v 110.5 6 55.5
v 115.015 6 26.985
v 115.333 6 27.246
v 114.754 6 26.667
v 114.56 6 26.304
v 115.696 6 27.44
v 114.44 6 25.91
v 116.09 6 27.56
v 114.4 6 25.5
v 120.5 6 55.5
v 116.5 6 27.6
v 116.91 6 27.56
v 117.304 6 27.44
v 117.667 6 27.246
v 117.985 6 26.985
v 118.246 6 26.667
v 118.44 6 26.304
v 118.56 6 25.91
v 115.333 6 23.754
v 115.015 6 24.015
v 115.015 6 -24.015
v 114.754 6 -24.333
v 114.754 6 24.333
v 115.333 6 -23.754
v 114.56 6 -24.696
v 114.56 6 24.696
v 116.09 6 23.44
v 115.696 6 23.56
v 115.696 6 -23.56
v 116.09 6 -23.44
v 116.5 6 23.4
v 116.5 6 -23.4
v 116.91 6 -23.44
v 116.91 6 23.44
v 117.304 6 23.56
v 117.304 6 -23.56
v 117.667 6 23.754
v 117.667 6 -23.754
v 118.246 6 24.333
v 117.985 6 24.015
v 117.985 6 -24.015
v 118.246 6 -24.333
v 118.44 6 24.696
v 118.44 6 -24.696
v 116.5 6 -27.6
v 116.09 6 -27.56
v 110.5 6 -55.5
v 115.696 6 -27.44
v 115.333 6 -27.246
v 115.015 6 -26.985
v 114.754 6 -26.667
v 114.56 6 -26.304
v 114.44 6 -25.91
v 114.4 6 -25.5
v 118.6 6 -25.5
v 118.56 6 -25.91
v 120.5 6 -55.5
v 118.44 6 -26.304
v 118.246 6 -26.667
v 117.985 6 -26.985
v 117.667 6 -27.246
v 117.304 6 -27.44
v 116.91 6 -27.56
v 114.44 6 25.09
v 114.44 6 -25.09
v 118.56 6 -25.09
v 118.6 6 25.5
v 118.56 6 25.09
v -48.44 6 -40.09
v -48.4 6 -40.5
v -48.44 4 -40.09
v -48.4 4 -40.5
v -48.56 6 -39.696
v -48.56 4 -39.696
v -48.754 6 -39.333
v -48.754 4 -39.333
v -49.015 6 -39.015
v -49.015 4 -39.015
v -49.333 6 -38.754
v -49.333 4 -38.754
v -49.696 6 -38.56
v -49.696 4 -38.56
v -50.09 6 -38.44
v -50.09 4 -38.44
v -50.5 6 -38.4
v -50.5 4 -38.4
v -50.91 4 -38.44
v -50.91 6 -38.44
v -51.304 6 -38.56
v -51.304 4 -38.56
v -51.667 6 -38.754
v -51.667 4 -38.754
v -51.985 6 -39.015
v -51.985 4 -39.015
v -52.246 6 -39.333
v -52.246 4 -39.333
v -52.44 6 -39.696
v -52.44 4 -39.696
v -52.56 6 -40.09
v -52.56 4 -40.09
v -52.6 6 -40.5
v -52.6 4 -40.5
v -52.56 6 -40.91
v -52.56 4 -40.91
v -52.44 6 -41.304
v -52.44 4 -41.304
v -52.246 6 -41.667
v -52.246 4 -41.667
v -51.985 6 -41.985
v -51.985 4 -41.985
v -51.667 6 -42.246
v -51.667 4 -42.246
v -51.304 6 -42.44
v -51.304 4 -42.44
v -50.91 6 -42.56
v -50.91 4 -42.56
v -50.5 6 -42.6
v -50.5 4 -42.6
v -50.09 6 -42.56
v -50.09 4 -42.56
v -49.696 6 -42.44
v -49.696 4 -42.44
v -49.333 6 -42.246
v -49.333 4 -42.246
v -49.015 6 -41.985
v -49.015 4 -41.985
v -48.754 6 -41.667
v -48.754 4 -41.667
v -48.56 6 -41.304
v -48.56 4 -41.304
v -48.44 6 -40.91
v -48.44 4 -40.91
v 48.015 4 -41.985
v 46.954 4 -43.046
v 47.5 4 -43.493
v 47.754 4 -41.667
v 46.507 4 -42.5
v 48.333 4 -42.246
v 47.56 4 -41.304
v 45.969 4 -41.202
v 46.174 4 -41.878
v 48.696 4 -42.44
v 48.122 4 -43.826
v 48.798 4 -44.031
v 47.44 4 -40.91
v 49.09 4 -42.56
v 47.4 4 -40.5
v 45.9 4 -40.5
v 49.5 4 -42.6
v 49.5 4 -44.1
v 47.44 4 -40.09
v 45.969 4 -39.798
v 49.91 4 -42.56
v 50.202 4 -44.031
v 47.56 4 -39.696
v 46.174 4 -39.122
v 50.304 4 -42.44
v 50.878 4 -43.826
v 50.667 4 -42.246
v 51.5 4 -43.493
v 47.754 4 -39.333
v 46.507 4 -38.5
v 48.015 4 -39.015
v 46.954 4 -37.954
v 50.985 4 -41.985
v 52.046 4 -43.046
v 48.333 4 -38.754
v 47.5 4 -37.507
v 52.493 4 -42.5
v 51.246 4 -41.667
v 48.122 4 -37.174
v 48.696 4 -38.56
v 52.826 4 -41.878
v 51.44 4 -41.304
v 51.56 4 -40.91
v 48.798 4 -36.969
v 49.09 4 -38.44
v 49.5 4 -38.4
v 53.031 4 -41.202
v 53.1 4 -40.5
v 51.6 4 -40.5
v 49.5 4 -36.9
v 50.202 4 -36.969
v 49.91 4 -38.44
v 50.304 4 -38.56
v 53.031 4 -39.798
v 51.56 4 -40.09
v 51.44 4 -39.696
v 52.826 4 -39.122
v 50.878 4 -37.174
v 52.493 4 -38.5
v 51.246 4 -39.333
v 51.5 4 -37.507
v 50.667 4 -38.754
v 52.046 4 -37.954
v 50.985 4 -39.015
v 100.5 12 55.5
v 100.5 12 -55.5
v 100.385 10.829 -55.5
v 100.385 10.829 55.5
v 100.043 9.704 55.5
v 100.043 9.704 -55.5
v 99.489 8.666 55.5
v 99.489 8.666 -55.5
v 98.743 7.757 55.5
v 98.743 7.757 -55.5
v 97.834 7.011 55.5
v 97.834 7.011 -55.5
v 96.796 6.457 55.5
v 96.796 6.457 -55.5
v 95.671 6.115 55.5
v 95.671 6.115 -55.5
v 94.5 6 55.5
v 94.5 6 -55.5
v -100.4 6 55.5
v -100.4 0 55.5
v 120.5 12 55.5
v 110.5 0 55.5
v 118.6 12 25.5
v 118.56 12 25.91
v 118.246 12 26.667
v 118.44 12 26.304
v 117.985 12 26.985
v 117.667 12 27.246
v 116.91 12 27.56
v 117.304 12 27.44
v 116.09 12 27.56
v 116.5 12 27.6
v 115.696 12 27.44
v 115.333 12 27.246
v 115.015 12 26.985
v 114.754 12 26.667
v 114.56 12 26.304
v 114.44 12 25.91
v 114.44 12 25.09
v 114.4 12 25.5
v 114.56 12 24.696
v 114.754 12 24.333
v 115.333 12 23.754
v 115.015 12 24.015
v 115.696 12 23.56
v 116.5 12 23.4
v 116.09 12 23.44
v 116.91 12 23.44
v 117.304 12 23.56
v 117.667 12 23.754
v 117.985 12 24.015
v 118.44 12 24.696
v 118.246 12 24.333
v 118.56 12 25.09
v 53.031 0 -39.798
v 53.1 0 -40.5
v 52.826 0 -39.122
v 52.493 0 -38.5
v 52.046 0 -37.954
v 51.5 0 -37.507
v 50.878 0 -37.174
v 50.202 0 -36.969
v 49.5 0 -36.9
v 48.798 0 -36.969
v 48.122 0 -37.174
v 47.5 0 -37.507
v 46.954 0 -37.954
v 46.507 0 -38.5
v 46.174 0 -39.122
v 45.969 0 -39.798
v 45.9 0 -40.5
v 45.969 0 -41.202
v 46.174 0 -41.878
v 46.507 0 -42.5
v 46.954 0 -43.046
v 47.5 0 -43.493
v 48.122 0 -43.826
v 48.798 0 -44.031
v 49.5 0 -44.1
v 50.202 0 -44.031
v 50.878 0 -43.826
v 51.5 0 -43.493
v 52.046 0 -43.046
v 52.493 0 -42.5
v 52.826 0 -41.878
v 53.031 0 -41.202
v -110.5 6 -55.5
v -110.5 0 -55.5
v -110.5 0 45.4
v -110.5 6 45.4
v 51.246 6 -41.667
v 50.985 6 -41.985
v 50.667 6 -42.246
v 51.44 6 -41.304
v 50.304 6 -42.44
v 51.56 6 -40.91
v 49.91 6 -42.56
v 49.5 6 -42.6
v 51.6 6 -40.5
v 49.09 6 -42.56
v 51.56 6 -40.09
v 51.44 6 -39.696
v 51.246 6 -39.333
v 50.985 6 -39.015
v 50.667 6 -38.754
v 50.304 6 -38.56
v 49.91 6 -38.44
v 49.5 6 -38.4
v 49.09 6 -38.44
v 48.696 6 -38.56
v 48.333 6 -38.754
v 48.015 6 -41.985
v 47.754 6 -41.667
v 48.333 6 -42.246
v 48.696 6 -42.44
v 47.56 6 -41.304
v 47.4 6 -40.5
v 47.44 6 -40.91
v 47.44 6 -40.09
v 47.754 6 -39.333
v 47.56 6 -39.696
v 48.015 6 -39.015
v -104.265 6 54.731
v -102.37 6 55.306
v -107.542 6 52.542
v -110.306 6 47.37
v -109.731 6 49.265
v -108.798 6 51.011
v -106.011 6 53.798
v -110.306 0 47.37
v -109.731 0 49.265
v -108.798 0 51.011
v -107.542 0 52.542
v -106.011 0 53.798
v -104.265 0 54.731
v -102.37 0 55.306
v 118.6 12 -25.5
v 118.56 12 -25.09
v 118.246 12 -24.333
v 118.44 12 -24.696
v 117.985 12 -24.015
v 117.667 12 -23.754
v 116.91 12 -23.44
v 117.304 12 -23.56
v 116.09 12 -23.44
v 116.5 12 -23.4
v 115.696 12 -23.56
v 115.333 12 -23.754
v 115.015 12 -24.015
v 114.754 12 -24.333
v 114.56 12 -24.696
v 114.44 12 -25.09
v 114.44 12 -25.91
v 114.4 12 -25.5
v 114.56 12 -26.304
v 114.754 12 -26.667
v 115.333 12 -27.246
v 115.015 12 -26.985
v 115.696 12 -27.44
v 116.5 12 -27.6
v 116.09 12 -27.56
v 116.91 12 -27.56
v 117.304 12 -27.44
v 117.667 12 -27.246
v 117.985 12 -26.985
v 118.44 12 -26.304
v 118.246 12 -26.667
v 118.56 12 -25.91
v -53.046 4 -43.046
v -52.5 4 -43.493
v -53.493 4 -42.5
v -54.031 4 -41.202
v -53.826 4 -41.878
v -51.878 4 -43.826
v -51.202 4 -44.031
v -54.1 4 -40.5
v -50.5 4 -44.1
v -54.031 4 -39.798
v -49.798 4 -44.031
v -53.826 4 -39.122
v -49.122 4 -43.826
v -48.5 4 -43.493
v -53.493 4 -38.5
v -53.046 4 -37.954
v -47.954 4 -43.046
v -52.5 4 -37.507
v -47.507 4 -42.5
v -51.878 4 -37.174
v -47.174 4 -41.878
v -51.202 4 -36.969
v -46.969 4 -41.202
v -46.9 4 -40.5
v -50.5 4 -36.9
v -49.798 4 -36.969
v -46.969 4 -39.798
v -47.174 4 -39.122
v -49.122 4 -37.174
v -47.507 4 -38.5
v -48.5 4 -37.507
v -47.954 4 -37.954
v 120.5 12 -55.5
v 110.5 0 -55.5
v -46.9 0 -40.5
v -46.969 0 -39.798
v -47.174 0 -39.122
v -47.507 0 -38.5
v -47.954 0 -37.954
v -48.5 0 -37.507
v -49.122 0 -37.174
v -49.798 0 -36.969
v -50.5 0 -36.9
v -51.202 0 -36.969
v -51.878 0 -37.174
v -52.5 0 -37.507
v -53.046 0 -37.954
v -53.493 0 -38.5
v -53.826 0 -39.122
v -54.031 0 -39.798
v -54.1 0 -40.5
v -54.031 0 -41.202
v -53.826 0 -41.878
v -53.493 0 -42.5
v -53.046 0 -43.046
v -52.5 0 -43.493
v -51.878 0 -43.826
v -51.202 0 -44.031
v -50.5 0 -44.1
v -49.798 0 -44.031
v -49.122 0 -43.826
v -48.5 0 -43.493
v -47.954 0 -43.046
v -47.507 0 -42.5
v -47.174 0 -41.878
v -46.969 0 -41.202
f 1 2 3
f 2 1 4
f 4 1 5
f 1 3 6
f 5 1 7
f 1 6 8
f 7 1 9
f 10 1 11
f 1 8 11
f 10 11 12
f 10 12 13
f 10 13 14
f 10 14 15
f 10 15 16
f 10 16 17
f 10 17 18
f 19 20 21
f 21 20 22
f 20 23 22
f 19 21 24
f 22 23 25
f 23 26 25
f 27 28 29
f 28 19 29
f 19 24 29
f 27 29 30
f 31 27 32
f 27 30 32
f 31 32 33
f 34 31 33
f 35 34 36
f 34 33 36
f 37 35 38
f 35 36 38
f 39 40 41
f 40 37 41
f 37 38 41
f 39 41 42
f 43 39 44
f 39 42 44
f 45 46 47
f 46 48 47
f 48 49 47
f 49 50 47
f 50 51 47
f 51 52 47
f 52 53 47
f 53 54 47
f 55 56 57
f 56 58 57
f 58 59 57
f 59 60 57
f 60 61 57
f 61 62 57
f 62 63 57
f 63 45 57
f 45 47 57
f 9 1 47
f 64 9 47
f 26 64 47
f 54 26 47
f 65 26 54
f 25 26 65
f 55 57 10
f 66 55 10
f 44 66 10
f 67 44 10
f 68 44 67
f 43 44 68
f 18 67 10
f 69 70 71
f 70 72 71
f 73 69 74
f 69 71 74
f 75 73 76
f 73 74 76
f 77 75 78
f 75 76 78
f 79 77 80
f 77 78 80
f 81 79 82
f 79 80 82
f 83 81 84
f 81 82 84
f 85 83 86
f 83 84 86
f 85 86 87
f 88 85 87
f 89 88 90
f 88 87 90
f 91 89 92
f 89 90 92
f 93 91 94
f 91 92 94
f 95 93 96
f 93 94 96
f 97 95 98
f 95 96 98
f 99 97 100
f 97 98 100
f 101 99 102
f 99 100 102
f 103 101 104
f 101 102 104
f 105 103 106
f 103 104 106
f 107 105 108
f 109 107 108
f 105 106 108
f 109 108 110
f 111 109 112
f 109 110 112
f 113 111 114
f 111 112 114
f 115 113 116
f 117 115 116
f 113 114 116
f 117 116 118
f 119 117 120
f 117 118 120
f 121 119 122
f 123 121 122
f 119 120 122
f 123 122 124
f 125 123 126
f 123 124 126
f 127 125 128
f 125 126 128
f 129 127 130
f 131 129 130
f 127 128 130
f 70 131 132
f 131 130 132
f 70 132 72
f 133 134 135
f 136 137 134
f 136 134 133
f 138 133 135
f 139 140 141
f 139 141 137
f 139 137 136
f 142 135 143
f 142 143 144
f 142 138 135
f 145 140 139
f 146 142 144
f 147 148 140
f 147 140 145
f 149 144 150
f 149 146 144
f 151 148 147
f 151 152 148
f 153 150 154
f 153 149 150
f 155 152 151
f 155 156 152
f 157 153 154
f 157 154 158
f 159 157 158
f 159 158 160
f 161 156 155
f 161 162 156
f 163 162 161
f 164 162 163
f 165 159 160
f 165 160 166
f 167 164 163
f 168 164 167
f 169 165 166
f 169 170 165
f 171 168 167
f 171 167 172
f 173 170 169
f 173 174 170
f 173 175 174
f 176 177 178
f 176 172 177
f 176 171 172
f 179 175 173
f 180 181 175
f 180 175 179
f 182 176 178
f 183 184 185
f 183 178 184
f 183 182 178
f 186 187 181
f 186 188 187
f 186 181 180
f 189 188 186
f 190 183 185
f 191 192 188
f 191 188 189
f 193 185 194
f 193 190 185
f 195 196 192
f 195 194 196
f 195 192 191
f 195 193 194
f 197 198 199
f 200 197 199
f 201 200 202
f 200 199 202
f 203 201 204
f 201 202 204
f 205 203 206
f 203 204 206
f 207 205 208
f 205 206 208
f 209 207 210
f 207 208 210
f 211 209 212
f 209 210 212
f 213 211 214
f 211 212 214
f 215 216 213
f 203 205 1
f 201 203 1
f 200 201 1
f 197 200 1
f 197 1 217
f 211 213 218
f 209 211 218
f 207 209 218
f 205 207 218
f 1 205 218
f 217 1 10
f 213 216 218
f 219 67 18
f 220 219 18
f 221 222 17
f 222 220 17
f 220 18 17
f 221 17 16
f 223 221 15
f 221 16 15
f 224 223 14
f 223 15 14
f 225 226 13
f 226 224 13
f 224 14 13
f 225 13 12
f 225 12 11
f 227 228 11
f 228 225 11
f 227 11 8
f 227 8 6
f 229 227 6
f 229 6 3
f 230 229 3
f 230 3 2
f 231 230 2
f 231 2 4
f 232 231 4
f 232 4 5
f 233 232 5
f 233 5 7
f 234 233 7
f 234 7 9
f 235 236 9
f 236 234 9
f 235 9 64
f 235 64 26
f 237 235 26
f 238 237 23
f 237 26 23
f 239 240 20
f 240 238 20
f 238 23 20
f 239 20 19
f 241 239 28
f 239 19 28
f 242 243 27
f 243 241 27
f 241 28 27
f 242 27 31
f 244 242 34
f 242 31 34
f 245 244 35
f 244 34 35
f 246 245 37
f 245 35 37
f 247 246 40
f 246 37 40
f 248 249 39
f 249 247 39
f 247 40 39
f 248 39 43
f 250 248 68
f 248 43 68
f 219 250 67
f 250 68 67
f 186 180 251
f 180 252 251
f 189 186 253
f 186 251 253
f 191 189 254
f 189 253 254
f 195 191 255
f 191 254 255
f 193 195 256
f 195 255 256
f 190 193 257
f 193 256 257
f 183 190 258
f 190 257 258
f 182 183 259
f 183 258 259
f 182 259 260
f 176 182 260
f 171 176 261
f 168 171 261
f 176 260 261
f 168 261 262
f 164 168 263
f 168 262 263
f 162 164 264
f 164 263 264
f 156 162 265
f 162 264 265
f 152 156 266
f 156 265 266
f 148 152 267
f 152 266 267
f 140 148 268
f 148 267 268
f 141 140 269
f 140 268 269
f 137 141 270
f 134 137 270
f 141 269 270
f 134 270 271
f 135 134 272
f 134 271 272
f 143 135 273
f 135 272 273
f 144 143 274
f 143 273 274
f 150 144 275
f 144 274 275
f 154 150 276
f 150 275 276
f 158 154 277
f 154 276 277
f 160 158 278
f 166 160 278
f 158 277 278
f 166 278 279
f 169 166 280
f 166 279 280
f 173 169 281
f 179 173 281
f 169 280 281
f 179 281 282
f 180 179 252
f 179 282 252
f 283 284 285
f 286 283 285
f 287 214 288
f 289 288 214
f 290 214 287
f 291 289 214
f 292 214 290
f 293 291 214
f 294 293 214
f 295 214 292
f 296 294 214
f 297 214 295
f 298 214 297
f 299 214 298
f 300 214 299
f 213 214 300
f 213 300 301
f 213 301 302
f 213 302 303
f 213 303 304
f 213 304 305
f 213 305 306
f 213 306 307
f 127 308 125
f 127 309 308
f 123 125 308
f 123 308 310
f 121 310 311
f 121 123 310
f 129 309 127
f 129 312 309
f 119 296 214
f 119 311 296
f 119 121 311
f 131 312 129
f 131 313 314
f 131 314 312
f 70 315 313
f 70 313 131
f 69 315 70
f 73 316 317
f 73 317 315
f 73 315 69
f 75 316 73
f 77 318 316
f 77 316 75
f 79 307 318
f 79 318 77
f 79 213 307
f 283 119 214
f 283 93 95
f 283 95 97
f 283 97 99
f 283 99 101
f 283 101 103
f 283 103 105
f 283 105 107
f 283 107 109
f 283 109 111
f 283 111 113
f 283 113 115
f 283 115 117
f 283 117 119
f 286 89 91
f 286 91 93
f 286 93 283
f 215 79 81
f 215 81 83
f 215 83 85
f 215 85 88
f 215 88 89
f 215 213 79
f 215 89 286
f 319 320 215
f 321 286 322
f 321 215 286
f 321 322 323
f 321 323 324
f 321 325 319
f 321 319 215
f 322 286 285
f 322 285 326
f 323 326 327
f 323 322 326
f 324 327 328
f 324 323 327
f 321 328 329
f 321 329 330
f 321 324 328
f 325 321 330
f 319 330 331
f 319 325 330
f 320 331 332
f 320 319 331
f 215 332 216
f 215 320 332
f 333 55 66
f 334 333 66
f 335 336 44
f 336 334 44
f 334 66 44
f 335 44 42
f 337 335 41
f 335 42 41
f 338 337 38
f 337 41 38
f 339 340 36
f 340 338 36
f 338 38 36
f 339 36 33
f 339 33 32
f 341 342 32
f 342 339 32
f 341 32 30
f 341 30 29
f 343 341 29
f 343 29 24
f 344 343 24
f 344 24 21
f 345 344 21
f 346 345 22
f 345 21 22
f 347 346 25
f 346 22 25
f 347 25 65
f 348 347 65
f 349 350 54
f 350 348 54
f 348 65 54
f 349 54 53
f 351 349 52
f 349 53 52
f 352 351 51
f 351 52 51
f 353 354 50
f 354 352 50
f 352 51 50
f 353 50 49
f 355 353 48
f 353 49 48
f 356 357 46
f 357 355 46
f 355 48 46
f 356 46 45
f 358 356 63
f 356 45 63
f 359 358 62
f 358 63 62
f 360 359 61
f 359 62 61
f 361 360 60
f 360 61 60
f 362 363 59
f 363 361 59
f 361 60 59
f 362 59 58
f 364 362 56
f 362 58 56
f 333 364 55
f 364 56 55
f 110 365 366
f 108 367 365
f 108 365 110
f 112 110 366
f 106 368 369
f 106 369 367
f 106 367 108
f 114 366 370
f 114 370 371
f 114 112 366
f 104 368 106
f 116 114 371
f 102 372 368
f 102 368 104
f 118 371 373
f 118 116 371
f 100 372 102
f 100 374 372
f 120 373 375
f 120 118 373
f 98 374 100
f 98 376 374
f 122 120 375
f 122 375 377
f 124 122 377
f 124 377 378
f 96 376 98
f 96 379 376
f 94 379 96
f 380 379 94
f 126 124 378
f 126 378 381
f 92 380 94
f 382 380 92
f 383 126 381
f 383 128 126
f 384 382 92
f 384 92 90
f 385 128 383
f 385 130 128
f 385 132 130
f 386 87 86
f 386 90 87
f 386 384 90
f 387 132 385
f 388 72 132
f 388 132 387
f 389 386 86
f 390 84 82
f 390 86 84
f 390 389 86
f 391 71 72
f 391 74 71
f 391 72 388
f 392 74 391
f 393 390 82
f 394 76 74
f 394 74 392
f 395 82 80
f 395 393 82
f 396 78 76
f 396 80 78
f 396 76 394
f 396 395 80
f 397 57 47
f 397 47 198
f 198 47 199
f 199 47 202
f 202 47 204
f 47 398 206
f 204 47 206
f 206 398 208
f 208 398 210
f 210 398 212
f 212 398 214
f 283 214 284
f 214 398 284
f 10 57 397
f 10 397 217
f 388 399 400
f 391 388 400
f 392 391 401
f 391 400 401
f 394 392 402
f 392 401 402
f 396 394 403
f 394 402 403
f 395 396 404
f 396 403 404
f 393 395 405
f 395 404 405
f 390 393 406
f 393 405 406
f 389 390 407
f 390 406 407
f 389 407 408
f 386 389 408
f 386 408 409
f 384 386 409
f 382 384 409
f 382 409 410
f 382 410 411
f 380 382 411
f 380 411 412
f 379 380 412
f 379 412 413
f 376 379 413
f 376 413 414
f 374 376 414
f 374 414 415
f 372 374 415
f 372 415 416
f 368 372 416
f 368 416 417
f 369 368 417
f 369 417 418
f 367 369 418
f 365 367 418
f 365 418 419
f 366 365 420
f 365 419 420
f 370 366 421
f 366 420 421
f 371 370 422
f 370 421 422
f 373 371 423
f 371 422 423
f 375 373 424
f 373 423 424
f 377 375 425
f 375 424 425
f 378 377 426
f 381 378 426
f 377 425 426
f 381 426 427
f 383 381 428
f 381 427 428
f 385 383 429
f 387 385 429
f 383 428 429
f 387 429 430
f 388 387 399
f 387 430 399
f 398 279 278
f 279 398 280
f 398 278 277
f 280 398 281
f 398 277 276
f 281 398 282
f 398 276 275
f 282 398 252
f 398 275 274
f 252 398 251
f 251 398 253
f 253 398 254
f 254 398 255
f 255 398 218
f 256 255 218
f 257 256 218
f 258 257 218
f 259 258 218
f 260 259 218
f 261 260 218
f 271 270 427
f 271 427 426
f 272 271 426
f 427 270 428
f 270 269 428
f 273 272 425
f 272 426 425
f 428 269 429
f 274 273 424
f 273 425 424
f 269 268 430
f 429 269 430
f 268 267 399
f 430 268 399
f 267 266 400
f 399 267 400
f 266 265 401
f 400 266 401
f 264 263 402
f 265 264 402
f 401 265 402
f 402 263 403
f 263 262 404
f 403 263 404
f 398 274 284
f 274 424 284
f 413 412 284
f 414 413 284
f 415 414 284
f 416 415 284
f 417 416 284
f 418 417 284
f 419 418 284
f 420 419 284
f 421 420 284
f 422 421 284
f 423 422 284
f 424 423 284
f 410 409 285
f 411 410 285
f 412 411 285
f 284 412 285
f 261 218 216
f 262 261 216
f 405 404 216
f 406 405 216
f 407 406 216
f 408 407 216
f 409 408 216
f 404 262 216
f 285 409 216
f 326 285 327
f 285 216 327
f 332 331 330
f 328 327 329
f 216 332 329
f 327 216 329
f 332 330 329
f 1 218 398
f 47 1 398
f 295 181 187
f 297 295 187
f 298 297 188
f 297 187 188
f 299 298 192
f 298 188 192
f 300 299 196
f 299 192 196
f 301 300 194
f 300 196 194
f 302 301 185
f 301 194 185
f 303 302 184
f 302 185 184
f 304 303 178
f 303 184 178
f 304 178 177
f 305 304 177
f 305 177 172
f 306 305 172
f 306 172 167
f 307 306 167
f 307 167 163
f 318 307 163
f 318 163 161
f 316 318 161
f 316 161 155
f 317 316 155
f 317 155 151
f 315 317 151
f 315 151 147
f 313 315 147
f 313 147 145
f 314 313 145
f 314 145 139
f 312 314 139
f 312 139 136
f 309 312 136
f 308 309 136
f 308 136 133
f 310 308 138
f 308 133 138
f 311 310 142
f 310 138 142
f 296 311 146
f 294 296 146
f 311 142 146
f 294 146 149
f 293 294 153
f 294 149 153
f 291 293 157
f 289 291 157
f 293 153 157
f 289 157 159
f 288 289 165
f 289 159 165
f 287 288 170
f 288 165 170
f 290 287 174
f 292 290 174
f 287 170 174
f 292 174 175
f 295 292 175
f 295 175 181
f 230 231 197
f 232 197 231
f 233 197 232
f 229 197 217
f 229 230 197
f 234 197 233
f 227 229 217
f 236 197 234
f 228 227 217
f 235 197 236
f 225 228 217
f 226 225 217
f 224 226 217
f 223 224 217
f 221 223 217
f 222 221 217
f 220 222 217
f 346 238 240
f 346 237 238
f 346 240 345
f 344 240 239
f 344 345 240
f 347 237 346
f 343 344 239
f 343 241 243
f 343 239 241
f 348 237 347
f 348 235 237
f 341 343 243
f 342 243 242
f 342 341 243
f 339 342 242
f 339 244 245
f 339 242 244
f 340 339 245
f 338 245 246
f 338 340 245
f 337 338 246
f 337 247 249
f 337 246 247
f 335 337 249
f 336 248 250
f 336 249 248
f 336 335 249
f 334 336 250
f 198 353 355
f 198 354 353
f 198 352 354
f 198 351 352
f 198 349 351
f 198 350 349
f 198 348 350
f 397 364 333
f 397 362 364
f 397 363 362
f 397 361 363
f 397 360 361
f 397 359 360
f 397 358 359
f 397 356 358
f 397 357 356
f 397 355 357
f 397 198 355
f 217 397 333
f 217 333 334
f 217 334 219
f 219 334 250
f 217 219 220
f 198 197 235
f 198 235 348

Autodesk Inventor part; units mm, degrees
ref_plane "YZ Plane" through (0, 0, 0) normal (1, 0, 0) x (0, 1, 0)
ref_plane "XZ Plane" through (0, 0, 0) normal (0, 1, 0) x (-1, 0, 0)
ref_plane "XY Plane" through (0, 0, 0) normal (0, 0, 1) x (1, 0, 0)
sketch "草图1" plane through (0, 0, 0) normal (0, 1, 0) x (-1, 0, 0)
  line L0 (110.5, 55.5) -> (-110.5, 55.5)
  line L1 (-110.5, 55.5) -> (-110.5, -55.5)
  line L2 (-110.5, -55.5) -> (110.5, -55.5)
  line L3 (110.5, -55.5) -> (110.5, 55.5)
  line L4 (0, 7.5575) -> (0, -11)
  line L5 (8.5019, 0) -> (-7, 0)
  point P0 (0, 0)
  dimension "d0" = 221
  dimension "d1" = 111
extrude "拉伸1" add sketch "草图1" along normal blind 6
fillet "圆角1" radius 10.1 1 edges at (-110.5, 3, 55.5)
sketch "草图2" plane through (0, 6, 0) normal (0, 1, 0) x (1, 0, 0)
  line L0 (110.5, 55.5) -> (-110.5, 55.5) projected
  line L1 (100.5, 55.5) -> (120.5, 55.5)
  line L2 (120.5, 55.5) -> (120.5, -55.5)
  line L3 (120.5, -55.5) -> (100.5, -55.5)
  line L4 (100.5, -55.5) -> (100.5, 55.5)
  line L5 (110.5, -55.5) -> (110.5, 55.5) projected
  line L6 (-100.4, -55.5) -> (110.5, -55.5) projected
  circle A0 centre (116.5, 25.5) radius 2.1
  circle A1 centre (116.5, -25.5) radius 2.1
  point P0 (0, 0)
  dimension "d5" = 20
  dimension "d6" = 10
  dimension "d7" = 4.2
  dimension "d8" = 4.2
  dimension "d9" = 4
  dimension "d10" = 4
  dimension "d11" = 30
  dimension "d12" = 30
extrude "拉伸2" add sketch "草图2" along normal blind 6
fillet "圆角2" radius 6 1 edges at (100.5, 6, 0)
sketch "草图3" plane through (0, 0, 0) normal (0, -1, 0) x (1, 0, 0)
  circle A0 centre (-50.5, -40.5) radius 2.1
  circle A1 centre (49.5, -40.5) radius 2.1
  line L0 (110.5, -55.5) -> (-110.5, -55.5) projected
  line L1 (-110.5, -55.5) -> (-110.5, 45.4) projected
  point P0 (0, 0)
  dimension "d16" = 4.2
  dimension "d17" = 4.2
  dimension "d18" = 15
  dimension "d19" = 15
  dimension "d20" = 60
  dimension "d21" = 100
extrude "拉伸3" cut sketch "草图3" against normal blind 10
sketch "草图4" plane through (0, 0, 0) normal (0, -1, 0) x (1, 0, 0)
  circle A0 centre (-50.5, -40.5) radius 2.1 projected
  circle A1 centre (-50.5, -40.5) radius 3.6
  circle A2 centre (49.5, -40.5) radius 2.1 projected
  circle A3 centre (49.5, -40.5) radius 3.6
  point P0 (0, 0)
  dimension "d24" = 7.2
  dimension "d25" = 7.2
extrude "拉伸4" cut sketch "草图4" against normal blind 4 contours A0 | A1 | A2 | A3
properties part number "底板_A"
